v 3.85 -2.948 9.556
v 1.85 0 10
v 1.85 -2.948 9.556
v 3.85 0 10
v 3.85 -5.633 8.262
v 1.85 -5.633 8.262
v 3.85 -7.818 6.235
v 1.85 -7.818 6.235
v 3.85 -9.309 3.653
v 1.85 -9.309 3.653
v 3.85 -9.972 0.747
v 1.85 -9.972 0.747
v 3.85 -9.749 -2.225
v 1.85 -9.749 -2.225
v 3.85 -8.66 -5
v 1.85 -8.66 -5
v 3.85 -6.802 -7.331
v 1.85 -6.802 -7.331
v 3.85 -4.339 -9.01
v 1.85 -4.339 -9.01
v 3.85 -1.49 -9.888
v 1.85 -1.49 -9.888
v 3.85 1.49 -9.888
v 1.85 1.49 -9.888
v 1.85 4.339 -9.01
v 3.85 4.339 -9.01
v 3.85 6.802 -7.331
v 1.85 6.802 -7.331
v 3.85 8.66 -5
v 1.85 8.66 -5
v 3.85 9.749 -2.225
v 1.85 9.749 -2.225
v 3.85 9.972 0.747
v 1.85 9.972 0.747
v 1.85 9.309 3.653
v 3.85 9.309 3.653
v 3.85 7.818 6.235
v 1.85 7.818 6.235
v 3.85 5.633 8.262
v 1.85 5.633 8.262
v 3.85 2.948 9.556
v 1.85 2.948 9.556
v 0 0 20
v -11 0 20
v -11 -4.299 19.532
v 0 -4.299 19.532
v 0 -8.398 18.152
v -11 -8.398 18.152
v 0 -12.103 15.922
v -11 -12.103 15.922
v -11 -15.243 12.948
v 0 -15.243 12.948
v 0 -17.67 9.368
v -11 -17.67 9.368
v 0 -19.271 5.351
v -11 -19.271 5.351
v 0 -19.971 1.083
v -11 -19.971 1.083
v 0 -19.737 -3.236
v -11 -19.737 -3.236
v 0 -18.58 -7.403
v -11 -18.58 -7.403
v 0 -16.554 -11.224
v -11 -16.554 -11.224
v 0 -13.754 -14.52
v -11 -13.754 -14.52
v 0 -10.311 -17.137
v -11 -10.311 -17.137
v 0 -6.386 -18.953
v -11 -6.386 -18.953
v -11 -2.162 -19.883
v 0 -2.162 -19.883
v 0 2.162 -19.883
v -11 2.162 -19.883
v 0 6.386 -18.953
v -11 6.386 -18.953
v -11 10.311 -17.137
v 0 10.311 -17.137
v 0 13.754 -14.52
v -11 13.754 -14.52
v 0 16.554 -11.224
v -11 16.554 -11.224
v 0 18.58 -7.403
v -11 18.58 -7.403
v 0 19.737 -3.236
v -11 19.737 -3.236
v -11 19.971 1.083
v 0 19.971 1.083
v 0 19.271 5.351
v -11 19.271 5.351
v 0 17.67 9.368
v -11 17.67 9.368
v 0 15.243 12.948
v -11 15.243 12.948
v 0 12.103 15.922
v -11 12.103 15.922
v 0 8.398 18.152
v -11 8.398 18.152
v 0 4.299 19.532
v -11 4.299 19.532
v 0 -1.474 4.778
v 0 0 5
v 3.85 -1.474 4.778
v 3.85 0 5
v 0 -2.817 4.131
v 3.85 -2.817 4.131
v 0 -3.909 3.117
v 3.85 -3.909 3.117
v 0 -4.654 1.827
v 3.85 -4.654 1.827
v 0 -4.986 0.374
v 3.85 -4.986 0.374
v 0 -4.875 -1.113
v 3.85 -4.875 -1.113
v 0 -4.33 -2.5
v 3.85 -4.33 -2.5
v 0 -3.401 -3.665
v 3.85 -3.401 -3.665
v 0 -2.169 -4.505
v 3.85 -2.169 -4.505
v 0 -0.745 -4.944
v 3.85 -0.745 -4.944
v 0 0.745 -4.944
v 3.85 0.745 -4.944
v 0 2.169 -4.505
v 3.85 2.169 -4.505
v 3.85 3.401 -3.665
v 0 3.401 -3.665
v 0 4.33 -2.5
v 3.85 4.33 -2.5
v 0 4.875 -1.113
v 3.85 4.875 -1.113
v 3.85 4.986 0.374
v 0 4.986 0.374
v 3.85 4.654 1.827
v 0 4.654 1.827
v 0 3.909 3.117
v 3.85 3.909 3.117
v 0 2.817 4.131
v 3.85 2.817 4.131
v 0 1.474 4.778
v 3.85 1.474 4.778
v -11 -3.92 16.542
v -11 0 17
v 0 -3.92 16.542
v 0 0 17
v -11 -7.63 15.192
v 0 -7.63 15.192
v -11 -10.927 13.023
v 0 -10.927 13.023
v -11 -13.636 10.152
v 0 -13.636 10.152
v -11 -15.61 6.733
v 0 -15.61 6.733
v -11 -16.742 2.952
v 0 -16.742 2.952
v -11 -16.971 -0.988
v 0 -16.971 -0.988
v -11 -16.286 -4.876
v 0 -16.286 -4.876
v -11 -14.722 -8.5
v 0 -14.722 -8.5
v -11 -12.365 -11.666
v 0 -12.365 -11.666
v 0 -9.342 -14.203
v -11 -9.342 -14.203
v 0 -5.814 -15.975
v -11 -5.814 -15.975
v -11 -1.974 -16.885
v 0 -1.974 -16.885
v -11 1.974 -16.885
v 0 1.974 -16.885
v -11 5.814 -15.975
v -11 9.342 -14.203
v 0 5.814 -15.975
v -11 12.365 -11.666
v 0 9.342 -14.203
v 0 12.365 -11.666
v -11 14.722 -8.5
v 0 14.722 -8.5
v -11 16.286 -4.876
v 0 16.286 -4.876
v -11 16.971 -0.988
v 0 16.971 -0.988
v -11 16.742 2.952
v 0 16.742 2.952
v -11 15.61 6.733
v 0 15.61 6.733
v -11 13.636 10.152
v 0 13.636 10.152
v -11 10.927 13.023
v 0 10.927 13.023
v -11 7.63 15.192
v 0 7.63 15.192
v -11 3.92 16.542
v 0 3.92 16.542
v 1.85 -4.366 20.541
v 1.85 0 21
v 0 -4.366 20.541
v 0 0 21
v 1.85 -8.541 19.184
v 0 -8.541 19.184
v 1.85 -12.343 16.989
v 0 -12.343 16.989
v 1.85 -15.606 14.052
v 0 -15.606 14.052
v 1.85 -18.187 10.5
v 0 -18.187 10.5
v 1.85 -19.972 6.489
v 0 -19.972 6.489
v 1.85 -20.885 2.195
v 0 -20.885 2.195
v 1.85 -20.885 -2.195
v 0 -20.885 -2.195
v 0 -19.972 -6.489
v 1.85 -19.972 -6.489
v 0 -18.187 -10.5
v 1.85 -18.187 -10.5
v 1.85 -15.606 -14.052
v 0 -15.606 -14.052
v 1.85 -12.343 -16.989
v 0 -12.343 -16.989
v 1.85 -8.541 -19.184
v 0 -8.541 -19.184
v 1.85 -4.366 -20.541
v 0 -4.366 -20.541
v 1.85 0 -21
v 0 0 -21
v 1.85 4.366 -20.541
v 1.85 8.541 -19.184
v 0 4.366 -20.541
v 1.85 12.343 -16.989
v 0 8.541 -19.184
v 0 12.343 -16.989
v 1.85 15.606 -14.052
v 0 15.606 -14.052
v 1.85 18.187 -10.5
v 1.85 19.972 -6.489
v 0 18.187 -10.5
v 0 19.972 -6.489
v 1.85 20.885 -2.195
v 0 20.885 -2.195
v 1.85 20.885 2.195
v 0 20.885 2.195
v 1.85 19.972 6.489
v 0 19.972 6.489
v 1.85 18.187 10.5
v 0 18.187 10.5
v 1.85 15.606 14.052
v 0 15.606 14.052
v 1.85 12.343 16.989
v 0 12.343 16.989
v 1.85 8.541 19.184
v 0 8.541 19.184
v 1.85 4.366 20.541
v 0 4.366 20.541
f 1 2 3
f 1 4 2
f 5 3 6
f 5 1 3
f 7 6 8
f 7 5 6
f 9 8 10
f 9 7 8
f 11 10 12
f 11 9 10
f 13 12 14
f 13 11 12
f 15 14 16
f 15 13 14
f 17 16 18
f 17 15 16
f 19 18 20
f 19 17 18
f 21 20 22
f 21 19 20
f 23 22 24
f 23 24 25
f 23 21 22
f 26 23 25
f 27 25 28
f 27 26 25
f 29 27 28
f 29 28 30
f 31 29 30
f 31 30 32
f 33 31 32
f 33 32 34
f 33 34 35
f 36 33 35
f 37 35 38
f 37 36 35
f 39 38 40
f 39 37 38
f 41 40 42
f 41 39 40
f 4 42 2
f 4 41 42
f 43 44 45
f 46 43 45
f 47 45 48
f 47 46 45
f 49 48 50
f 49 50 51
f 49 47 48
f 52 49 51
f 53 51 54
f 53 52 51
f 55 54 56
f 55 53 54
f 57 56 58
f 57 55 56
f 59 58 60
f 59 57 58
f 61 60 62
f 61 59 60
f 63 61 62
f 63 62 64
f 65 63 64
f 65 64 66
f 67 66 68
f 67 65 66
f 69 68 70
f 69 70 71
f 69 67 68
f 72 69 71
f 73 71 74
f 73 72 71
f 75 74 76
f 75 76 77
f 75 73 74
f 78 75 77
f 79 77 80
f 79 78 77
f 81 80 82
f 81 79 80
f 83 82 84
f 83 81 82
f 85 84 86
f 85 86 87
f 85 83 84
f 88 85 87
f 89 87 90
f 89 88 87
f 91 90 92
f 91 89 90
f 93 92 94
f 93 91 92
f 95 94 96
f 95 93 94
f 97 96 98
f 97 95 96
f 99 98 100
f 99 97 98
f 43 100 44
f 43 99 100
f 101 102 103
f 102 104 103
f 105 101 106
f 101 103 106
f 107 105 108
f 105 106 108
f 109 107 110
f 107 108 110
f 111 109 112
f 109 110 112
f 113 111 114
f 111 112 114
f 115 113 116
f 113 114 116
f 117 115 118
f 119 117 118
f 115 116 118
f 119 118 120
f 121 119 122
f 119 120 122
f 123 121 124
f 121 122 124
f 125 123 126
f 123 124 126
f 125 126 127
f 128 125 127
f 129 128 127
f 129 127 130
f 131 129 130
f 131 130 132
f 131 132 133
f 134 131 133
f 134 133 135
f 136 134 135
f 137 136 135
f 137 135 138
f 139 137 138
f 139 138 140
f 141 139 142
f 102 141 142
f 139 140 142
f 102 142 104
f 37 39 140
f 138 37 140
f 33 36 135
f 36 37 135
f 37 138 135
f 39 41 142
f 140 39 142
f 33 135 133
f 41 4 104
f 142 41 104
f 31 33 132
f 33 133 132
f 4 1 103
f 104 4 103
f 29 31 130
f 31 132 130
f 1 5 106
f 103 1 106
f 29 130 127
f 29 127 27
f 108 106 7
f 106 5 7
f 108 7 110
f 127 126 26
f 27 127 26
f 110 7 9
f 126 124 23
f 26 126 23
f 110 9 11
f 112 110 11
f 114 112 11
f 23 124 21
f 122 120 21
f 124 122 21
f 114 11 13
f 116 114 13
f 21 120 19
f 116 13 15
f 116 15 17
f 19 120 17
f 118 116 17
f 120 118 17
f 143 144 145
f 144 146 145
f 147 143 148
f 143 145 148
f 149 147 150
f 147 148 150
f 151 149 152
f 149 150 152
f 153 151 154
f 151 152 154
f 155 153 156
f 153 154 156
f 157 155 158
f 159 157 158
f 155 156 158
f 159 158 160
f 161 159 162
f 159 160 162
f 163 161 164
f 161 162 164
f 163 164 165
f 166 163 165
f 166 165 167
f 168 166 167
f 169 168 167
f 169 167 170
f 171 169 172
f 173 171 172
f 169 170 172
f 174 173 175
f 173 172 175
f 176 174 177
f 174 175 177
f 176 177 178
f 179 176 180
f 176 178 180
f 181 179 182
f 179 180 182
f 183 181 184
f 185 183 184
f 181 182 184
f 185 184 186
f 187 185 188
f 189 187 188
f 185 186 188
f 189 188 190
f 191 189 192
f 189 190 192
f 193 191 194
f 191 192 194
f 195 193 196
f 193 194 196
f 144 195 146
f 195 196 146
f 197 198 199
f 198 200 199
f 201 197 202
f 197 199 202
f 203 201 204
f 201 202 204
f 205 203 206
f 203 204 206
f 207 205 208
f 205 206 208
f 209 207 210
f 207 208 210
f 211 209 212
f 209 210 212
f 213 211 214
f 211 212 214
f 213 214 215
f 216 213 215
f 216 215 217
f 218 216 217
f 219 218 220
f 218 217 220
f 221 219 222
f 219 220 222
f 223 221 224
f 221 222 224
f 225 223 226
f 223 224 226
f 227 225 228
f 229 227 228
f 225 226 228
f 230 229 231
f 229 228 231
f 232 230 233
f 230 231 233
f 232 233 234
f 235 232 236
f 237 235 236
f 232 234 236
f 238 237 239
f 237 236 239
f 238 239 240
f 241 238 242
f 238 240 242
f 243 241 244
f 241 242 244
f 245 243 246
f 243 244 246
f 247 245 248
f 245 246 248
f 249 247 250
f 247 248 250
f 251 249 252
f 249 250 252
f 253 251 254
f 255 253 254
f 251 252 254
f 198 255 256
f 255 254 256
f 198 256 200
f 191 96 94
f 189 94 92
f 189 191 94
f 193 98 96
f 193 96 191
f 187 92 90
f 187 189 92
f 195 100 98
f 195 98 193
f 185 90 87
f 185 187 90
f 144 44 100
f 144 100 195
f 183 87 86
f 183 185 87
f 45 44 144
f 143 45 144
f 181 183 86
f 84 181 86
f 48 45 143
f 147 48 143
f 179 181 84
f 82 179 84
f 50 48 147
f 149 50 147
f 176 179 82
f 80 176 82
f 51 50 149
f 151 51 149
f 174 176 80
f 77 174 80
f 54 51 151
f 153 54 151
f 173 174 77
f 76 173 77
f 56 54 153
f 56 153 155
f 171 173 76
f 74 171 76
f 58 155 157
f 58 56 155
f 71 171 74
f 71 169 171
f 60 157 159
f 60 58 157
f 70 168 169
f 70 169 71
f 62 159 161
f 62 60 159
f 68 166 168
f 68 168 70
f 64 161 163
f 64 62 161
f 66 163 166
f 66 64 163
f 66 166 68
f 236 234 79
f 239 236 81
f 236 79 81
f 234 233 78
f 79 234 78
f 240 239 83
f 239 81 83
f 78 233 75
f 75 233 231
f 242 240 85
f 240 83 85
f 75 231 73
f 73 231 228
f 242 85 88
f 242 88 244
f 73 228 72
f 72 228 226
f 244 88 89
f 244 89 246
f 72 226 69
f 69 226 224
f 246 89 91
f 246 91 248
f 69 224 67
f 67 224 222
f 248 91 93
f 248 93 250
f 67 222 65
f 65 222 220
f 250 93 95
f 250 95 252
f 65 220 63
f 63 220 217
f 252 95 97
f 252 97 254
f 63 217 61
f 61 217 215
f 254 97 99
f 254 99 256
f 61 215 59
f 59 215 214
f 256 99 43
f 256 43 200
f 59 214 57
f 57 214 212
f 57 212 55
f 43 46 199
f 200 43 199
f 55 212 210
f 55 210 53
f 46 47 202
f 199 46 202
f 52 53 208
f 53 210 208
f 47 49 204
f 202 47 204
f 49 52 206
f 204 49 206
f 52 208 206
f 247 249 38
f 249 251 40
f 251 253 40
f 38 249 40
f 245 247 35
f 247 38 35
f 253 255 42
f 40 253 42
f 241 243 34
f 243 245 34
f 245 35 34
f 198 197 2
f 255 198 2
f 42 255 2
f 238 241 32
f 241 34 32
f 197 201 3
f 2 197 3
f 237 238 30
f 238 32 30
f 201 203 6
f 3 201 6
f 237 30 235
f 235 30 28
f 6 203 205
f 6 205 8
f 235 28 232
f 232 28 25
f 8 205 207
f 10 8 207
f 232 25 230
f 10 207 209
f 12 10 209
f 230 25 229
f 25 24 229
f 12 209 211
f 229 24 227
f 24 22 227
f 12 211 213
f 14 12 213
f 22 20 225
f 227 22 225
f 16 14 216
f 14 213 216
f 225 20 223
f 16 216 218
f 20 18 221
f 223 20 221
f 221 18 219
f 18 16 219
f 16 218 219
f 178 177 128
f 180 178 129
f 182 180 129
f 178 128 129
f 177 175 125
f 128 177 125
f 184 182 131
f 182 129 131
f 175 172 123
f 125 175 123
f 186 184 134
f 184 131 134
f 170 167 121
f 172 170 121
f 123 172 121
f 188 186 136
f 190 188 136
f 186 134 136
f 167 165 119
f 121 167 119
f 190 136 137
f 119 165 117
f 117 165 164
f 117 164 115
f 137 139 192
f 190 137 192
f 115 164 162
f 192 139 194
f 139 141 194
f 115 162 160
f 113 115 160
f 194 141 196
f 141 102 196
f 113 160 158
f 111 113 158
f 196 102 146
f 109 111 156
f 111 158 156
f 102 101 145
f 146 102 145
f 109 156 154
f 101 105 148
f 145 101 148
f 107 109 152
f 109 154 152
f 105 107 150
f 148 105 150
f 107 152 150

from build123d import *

# Parameters (mm, degrees)
F0_W   = 11
F0_H   = 3
F0_W_2 = 2
F0_H_2 = 5


with BuildPart() as f1:
    # F0 (on Front) → F1 (revolve)
    with BuildSketch(Plane.XZ):
        with Locations((-5.5, 18.5)):
            Rectangle(F0_W, F0_H)
        Polygon((0, 17), (0, 5), (1.85, 5), (1.85, 10), (1.85, 21), (0, 21), (0, 20), align=None)
        with Locations((2.85, 7.5)):
            Rectangle(F0_W_2, F0_H_2)
    revolve(axis=Axis((4.390737, 0, 0), (1, 0, 0)))


solid = f1.part
